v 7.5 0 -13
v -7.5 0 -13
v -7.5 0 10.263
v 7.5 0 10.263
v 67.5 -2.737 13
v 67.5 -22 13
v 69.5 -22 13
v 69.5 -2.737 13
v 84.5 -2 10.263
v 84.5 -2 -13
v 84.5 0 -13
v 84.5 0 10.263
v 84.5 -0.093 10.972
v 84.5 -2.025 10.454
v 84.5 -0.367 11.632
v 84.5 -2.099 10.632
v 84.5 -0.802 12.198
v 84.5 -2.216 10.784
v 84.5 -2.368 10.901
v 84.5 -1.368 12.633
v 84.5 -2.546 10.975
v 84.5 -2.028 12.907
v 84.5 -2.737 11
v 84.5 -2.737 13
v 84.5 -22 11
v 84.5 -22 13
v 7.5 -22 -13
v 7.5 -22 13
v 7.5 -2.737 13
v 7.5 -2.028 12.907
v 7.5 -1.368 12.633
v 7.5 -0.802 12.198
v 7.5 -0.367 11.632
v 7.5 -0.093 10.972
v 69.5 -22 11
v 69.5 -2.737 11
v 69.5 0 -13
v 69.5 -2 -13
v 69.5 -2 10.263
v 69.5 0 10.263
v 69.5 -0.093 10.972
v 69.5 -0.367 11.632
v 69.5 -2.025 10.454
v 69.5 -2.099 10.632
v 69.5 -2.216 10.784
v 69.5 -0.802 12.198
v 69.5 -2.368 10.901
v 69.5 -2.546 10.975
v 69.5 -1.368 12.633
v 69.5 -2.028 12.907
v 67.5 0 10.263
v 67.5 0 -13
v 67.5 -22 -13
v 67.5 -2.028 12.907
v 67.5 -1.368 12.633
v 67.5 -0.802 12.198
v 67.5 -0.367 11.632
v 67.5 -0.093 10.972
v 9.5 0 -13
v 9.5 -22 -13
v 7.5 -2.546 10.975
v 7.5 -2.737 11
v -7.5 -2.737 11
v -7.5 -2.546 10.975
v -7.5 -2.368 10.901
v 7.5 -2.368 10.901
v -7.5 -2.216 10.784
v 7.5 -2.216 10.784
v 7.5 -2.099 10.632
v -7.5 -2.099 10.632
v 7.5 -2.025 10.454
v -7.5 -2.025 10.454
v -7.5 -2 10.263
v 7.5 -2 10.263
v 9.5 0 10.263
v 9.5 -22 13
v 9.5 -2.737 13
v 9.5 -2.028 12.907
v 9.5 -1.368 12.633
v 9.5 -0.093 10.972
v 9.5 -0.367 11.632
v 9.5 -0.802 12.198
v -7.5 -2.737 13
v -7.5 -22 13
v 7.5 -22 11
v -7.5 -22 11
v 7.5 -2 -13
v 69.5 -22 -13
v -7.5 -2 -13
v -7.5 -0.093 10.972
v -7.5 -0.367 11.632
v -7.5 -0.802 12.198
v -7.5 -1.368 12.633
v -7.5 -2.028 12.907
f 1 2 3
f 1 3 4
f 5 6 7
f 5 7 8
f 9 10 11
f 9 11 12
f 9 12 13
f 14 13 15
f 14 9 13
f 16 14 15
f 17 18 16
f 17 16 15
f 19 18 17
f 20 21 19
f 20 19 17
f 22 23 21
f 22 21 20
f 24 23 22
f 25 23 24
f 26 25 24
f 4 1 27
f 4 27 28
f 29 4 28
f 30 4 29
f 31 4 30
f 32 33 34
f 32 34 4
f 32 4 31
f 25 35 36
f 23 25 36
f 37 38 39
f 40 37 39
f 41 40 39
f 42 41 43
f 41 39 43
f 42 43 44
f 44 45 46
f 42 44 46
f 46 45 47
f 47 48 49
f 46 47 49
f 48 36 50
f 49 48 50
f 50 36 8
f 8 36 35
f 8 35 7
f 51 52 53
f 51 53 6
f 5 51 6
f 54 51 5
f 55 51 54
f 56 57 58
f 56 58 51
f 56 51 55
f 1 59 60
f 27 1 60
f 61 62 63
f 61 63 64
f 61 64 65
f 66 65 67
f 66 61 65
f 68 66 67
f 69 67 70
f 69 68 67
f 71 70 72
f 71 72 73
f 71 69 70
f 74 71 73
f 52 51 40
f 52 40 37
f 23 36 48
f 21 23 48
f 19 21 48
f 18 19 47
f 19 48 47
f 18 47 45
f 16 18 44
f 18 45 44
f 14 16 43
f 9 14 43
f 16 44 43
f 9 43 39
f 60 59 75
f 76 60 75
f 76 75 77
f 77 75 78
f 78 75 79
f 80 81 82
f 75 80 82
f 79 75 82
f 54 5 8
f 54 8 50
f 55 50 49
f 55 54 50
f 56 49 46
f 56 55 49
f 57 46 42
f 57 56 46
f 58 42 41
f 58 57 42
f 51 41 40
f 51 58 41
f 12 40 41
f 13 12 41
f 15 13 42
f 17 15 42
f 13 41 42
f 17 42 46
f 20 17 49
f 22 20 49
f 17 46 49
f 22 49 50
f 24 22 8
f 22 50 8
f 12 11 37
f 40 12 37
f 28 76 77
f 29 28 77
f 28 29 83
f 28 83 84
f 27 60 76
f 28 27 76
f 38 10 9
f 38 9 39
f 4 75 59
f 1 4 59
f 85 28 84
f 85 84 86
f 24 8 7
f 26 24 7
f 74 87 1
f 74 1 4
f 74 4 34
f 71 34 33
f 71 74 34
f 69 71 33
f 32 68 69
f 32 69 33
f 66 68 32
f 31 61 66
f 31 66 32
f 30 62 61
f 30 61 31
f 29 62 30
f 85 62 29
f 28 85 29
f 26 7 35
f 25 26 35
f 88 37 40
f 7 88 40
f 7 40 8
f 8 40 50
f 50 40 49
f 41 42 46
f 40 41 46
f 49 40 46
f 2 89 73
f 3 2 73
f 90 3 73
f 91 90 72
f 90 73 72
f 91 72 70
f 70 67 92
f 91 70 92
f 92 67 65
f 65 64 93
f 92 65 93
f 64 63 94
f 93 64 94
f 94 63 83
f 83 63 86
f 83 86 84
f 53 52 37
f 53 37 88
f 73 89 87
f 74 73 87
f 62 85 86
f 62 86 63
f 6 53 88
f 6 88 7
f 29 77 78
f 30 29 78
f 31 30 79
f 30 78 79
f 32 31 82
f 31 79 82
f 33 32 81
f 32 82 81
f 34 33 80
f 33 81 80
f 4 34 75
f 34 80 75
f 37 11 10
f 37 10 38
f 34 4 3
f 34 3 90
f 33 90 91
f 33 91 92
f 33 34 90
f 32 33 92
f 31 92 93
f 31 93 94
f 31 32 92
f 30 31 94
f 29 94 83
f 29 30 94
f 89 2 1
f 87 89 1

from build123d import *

# Parameters (mm, degrees)
SKETCH1_W                    = 15
SKETCH1_H                    = 26
BASE_FLANGE1_DEPTH           = 2
EDGE_FLANGE1_STRIP_W         = 9.4732
EDGE_FLANGE1_STRIP_H         = 2
EDGE_FLANGE1_STRIP_CUT_DEPTH = 15
EDGE_FLANGE1_DEPTH           = 15
BASE_FLANGE2_START           = 2
BASE_FLANGE2_DEPTH           = 2


# Sheet-metal steps are written as plain solids
with BuildPart() as part:
    # Sketch1 → Base-Flange1 (new body)
    with BuildSketch(Plane(origin=(0, 0, 0), x_dir=(1, 0, 0), z_dir=(0, 1, 0))):
        Rectangle(SKETCH1_W, SKETCH1_H)
    extrude(amount=-BASE_FLANGE1_DEPTH)

    # Edge-Flange1 strip (across the edge) → Edge-Flange1 strip cut (cut)
    with BuildSketch(Plane(origin=(7.5, -2, 13), x_dir=(0, 0, -1), z_dir=(-1, 0, 0))):
        with Locations((-2, -1)):
            Rectangle(EDGE_FLANGE1_STRIP_W, EDGE_FLANGE1_STRIP_H)
    extrude(amount=EDGE_FLANGE1_STRIP_CUT_DEPTH, mode=Mode.SUBTRACT)

    # Edge-Flange1 section (across the edge) → Edge-Flange1 (add)
    with BuildSketch(Plane(origin=(7.5, -2, 13), x_dir=(0, 0, -1), z_dir=(-1, 0, 0))):
        with BuildLine():
            Line((0, 0.7366), (0, 20))
            Line((0, 20), (2, 20))
            Line((2, 20), (2, 0.7366))
            ThreePointArc((2, 0.7366), (2.215745145, 0.215745145), (2.7366, 0))
            Line((2.7366, 0), (2.7366, -2))
            ThreePointArc((2.7366, -2), (0.801531583, -1.198468417), (0, 0.7366))
        make_face()
    extrude(amount=EDGE_FLANGE1_DEPTH)


with BuildPart() as body_2:
    # Sketch9 → Base-Flange2 (new body)
    with BuildSketch(Plane(origin=(7.5, 0, 0), x_dir=(0, 0, -1), z_dir=(1, 0, 0)).offset(BASE_FLANGE2_START)):
        with BuildLine():
            Line((-13, -22), (-13, -2.7366))
            ThreePointArc((-13, -2.7366), (-12.198468417, -0.801531583), (-10.2634, 0))
            Line((-10.2634, 0), (13, 0))
            Line((13, 0), (13, -22))
            Line((13, -22), (-13, -22))
        make_face()
    extrude(amount=-BASE_FLANGE2_DEPTH)


with BuildPart() as body_3:
    # Mirror1: mirrored copy
    add(part.part.mirror(Plane.ZY.offset(-38.5)))


with BuildPart() as body_4:
    # Mirror1 2: mirrored copy
    add(body_2.part.mirror(Plane.ZY.offset(-38.5)))


solid = Compound([part.part, body_2.part, body_3.part, body_4.part])
